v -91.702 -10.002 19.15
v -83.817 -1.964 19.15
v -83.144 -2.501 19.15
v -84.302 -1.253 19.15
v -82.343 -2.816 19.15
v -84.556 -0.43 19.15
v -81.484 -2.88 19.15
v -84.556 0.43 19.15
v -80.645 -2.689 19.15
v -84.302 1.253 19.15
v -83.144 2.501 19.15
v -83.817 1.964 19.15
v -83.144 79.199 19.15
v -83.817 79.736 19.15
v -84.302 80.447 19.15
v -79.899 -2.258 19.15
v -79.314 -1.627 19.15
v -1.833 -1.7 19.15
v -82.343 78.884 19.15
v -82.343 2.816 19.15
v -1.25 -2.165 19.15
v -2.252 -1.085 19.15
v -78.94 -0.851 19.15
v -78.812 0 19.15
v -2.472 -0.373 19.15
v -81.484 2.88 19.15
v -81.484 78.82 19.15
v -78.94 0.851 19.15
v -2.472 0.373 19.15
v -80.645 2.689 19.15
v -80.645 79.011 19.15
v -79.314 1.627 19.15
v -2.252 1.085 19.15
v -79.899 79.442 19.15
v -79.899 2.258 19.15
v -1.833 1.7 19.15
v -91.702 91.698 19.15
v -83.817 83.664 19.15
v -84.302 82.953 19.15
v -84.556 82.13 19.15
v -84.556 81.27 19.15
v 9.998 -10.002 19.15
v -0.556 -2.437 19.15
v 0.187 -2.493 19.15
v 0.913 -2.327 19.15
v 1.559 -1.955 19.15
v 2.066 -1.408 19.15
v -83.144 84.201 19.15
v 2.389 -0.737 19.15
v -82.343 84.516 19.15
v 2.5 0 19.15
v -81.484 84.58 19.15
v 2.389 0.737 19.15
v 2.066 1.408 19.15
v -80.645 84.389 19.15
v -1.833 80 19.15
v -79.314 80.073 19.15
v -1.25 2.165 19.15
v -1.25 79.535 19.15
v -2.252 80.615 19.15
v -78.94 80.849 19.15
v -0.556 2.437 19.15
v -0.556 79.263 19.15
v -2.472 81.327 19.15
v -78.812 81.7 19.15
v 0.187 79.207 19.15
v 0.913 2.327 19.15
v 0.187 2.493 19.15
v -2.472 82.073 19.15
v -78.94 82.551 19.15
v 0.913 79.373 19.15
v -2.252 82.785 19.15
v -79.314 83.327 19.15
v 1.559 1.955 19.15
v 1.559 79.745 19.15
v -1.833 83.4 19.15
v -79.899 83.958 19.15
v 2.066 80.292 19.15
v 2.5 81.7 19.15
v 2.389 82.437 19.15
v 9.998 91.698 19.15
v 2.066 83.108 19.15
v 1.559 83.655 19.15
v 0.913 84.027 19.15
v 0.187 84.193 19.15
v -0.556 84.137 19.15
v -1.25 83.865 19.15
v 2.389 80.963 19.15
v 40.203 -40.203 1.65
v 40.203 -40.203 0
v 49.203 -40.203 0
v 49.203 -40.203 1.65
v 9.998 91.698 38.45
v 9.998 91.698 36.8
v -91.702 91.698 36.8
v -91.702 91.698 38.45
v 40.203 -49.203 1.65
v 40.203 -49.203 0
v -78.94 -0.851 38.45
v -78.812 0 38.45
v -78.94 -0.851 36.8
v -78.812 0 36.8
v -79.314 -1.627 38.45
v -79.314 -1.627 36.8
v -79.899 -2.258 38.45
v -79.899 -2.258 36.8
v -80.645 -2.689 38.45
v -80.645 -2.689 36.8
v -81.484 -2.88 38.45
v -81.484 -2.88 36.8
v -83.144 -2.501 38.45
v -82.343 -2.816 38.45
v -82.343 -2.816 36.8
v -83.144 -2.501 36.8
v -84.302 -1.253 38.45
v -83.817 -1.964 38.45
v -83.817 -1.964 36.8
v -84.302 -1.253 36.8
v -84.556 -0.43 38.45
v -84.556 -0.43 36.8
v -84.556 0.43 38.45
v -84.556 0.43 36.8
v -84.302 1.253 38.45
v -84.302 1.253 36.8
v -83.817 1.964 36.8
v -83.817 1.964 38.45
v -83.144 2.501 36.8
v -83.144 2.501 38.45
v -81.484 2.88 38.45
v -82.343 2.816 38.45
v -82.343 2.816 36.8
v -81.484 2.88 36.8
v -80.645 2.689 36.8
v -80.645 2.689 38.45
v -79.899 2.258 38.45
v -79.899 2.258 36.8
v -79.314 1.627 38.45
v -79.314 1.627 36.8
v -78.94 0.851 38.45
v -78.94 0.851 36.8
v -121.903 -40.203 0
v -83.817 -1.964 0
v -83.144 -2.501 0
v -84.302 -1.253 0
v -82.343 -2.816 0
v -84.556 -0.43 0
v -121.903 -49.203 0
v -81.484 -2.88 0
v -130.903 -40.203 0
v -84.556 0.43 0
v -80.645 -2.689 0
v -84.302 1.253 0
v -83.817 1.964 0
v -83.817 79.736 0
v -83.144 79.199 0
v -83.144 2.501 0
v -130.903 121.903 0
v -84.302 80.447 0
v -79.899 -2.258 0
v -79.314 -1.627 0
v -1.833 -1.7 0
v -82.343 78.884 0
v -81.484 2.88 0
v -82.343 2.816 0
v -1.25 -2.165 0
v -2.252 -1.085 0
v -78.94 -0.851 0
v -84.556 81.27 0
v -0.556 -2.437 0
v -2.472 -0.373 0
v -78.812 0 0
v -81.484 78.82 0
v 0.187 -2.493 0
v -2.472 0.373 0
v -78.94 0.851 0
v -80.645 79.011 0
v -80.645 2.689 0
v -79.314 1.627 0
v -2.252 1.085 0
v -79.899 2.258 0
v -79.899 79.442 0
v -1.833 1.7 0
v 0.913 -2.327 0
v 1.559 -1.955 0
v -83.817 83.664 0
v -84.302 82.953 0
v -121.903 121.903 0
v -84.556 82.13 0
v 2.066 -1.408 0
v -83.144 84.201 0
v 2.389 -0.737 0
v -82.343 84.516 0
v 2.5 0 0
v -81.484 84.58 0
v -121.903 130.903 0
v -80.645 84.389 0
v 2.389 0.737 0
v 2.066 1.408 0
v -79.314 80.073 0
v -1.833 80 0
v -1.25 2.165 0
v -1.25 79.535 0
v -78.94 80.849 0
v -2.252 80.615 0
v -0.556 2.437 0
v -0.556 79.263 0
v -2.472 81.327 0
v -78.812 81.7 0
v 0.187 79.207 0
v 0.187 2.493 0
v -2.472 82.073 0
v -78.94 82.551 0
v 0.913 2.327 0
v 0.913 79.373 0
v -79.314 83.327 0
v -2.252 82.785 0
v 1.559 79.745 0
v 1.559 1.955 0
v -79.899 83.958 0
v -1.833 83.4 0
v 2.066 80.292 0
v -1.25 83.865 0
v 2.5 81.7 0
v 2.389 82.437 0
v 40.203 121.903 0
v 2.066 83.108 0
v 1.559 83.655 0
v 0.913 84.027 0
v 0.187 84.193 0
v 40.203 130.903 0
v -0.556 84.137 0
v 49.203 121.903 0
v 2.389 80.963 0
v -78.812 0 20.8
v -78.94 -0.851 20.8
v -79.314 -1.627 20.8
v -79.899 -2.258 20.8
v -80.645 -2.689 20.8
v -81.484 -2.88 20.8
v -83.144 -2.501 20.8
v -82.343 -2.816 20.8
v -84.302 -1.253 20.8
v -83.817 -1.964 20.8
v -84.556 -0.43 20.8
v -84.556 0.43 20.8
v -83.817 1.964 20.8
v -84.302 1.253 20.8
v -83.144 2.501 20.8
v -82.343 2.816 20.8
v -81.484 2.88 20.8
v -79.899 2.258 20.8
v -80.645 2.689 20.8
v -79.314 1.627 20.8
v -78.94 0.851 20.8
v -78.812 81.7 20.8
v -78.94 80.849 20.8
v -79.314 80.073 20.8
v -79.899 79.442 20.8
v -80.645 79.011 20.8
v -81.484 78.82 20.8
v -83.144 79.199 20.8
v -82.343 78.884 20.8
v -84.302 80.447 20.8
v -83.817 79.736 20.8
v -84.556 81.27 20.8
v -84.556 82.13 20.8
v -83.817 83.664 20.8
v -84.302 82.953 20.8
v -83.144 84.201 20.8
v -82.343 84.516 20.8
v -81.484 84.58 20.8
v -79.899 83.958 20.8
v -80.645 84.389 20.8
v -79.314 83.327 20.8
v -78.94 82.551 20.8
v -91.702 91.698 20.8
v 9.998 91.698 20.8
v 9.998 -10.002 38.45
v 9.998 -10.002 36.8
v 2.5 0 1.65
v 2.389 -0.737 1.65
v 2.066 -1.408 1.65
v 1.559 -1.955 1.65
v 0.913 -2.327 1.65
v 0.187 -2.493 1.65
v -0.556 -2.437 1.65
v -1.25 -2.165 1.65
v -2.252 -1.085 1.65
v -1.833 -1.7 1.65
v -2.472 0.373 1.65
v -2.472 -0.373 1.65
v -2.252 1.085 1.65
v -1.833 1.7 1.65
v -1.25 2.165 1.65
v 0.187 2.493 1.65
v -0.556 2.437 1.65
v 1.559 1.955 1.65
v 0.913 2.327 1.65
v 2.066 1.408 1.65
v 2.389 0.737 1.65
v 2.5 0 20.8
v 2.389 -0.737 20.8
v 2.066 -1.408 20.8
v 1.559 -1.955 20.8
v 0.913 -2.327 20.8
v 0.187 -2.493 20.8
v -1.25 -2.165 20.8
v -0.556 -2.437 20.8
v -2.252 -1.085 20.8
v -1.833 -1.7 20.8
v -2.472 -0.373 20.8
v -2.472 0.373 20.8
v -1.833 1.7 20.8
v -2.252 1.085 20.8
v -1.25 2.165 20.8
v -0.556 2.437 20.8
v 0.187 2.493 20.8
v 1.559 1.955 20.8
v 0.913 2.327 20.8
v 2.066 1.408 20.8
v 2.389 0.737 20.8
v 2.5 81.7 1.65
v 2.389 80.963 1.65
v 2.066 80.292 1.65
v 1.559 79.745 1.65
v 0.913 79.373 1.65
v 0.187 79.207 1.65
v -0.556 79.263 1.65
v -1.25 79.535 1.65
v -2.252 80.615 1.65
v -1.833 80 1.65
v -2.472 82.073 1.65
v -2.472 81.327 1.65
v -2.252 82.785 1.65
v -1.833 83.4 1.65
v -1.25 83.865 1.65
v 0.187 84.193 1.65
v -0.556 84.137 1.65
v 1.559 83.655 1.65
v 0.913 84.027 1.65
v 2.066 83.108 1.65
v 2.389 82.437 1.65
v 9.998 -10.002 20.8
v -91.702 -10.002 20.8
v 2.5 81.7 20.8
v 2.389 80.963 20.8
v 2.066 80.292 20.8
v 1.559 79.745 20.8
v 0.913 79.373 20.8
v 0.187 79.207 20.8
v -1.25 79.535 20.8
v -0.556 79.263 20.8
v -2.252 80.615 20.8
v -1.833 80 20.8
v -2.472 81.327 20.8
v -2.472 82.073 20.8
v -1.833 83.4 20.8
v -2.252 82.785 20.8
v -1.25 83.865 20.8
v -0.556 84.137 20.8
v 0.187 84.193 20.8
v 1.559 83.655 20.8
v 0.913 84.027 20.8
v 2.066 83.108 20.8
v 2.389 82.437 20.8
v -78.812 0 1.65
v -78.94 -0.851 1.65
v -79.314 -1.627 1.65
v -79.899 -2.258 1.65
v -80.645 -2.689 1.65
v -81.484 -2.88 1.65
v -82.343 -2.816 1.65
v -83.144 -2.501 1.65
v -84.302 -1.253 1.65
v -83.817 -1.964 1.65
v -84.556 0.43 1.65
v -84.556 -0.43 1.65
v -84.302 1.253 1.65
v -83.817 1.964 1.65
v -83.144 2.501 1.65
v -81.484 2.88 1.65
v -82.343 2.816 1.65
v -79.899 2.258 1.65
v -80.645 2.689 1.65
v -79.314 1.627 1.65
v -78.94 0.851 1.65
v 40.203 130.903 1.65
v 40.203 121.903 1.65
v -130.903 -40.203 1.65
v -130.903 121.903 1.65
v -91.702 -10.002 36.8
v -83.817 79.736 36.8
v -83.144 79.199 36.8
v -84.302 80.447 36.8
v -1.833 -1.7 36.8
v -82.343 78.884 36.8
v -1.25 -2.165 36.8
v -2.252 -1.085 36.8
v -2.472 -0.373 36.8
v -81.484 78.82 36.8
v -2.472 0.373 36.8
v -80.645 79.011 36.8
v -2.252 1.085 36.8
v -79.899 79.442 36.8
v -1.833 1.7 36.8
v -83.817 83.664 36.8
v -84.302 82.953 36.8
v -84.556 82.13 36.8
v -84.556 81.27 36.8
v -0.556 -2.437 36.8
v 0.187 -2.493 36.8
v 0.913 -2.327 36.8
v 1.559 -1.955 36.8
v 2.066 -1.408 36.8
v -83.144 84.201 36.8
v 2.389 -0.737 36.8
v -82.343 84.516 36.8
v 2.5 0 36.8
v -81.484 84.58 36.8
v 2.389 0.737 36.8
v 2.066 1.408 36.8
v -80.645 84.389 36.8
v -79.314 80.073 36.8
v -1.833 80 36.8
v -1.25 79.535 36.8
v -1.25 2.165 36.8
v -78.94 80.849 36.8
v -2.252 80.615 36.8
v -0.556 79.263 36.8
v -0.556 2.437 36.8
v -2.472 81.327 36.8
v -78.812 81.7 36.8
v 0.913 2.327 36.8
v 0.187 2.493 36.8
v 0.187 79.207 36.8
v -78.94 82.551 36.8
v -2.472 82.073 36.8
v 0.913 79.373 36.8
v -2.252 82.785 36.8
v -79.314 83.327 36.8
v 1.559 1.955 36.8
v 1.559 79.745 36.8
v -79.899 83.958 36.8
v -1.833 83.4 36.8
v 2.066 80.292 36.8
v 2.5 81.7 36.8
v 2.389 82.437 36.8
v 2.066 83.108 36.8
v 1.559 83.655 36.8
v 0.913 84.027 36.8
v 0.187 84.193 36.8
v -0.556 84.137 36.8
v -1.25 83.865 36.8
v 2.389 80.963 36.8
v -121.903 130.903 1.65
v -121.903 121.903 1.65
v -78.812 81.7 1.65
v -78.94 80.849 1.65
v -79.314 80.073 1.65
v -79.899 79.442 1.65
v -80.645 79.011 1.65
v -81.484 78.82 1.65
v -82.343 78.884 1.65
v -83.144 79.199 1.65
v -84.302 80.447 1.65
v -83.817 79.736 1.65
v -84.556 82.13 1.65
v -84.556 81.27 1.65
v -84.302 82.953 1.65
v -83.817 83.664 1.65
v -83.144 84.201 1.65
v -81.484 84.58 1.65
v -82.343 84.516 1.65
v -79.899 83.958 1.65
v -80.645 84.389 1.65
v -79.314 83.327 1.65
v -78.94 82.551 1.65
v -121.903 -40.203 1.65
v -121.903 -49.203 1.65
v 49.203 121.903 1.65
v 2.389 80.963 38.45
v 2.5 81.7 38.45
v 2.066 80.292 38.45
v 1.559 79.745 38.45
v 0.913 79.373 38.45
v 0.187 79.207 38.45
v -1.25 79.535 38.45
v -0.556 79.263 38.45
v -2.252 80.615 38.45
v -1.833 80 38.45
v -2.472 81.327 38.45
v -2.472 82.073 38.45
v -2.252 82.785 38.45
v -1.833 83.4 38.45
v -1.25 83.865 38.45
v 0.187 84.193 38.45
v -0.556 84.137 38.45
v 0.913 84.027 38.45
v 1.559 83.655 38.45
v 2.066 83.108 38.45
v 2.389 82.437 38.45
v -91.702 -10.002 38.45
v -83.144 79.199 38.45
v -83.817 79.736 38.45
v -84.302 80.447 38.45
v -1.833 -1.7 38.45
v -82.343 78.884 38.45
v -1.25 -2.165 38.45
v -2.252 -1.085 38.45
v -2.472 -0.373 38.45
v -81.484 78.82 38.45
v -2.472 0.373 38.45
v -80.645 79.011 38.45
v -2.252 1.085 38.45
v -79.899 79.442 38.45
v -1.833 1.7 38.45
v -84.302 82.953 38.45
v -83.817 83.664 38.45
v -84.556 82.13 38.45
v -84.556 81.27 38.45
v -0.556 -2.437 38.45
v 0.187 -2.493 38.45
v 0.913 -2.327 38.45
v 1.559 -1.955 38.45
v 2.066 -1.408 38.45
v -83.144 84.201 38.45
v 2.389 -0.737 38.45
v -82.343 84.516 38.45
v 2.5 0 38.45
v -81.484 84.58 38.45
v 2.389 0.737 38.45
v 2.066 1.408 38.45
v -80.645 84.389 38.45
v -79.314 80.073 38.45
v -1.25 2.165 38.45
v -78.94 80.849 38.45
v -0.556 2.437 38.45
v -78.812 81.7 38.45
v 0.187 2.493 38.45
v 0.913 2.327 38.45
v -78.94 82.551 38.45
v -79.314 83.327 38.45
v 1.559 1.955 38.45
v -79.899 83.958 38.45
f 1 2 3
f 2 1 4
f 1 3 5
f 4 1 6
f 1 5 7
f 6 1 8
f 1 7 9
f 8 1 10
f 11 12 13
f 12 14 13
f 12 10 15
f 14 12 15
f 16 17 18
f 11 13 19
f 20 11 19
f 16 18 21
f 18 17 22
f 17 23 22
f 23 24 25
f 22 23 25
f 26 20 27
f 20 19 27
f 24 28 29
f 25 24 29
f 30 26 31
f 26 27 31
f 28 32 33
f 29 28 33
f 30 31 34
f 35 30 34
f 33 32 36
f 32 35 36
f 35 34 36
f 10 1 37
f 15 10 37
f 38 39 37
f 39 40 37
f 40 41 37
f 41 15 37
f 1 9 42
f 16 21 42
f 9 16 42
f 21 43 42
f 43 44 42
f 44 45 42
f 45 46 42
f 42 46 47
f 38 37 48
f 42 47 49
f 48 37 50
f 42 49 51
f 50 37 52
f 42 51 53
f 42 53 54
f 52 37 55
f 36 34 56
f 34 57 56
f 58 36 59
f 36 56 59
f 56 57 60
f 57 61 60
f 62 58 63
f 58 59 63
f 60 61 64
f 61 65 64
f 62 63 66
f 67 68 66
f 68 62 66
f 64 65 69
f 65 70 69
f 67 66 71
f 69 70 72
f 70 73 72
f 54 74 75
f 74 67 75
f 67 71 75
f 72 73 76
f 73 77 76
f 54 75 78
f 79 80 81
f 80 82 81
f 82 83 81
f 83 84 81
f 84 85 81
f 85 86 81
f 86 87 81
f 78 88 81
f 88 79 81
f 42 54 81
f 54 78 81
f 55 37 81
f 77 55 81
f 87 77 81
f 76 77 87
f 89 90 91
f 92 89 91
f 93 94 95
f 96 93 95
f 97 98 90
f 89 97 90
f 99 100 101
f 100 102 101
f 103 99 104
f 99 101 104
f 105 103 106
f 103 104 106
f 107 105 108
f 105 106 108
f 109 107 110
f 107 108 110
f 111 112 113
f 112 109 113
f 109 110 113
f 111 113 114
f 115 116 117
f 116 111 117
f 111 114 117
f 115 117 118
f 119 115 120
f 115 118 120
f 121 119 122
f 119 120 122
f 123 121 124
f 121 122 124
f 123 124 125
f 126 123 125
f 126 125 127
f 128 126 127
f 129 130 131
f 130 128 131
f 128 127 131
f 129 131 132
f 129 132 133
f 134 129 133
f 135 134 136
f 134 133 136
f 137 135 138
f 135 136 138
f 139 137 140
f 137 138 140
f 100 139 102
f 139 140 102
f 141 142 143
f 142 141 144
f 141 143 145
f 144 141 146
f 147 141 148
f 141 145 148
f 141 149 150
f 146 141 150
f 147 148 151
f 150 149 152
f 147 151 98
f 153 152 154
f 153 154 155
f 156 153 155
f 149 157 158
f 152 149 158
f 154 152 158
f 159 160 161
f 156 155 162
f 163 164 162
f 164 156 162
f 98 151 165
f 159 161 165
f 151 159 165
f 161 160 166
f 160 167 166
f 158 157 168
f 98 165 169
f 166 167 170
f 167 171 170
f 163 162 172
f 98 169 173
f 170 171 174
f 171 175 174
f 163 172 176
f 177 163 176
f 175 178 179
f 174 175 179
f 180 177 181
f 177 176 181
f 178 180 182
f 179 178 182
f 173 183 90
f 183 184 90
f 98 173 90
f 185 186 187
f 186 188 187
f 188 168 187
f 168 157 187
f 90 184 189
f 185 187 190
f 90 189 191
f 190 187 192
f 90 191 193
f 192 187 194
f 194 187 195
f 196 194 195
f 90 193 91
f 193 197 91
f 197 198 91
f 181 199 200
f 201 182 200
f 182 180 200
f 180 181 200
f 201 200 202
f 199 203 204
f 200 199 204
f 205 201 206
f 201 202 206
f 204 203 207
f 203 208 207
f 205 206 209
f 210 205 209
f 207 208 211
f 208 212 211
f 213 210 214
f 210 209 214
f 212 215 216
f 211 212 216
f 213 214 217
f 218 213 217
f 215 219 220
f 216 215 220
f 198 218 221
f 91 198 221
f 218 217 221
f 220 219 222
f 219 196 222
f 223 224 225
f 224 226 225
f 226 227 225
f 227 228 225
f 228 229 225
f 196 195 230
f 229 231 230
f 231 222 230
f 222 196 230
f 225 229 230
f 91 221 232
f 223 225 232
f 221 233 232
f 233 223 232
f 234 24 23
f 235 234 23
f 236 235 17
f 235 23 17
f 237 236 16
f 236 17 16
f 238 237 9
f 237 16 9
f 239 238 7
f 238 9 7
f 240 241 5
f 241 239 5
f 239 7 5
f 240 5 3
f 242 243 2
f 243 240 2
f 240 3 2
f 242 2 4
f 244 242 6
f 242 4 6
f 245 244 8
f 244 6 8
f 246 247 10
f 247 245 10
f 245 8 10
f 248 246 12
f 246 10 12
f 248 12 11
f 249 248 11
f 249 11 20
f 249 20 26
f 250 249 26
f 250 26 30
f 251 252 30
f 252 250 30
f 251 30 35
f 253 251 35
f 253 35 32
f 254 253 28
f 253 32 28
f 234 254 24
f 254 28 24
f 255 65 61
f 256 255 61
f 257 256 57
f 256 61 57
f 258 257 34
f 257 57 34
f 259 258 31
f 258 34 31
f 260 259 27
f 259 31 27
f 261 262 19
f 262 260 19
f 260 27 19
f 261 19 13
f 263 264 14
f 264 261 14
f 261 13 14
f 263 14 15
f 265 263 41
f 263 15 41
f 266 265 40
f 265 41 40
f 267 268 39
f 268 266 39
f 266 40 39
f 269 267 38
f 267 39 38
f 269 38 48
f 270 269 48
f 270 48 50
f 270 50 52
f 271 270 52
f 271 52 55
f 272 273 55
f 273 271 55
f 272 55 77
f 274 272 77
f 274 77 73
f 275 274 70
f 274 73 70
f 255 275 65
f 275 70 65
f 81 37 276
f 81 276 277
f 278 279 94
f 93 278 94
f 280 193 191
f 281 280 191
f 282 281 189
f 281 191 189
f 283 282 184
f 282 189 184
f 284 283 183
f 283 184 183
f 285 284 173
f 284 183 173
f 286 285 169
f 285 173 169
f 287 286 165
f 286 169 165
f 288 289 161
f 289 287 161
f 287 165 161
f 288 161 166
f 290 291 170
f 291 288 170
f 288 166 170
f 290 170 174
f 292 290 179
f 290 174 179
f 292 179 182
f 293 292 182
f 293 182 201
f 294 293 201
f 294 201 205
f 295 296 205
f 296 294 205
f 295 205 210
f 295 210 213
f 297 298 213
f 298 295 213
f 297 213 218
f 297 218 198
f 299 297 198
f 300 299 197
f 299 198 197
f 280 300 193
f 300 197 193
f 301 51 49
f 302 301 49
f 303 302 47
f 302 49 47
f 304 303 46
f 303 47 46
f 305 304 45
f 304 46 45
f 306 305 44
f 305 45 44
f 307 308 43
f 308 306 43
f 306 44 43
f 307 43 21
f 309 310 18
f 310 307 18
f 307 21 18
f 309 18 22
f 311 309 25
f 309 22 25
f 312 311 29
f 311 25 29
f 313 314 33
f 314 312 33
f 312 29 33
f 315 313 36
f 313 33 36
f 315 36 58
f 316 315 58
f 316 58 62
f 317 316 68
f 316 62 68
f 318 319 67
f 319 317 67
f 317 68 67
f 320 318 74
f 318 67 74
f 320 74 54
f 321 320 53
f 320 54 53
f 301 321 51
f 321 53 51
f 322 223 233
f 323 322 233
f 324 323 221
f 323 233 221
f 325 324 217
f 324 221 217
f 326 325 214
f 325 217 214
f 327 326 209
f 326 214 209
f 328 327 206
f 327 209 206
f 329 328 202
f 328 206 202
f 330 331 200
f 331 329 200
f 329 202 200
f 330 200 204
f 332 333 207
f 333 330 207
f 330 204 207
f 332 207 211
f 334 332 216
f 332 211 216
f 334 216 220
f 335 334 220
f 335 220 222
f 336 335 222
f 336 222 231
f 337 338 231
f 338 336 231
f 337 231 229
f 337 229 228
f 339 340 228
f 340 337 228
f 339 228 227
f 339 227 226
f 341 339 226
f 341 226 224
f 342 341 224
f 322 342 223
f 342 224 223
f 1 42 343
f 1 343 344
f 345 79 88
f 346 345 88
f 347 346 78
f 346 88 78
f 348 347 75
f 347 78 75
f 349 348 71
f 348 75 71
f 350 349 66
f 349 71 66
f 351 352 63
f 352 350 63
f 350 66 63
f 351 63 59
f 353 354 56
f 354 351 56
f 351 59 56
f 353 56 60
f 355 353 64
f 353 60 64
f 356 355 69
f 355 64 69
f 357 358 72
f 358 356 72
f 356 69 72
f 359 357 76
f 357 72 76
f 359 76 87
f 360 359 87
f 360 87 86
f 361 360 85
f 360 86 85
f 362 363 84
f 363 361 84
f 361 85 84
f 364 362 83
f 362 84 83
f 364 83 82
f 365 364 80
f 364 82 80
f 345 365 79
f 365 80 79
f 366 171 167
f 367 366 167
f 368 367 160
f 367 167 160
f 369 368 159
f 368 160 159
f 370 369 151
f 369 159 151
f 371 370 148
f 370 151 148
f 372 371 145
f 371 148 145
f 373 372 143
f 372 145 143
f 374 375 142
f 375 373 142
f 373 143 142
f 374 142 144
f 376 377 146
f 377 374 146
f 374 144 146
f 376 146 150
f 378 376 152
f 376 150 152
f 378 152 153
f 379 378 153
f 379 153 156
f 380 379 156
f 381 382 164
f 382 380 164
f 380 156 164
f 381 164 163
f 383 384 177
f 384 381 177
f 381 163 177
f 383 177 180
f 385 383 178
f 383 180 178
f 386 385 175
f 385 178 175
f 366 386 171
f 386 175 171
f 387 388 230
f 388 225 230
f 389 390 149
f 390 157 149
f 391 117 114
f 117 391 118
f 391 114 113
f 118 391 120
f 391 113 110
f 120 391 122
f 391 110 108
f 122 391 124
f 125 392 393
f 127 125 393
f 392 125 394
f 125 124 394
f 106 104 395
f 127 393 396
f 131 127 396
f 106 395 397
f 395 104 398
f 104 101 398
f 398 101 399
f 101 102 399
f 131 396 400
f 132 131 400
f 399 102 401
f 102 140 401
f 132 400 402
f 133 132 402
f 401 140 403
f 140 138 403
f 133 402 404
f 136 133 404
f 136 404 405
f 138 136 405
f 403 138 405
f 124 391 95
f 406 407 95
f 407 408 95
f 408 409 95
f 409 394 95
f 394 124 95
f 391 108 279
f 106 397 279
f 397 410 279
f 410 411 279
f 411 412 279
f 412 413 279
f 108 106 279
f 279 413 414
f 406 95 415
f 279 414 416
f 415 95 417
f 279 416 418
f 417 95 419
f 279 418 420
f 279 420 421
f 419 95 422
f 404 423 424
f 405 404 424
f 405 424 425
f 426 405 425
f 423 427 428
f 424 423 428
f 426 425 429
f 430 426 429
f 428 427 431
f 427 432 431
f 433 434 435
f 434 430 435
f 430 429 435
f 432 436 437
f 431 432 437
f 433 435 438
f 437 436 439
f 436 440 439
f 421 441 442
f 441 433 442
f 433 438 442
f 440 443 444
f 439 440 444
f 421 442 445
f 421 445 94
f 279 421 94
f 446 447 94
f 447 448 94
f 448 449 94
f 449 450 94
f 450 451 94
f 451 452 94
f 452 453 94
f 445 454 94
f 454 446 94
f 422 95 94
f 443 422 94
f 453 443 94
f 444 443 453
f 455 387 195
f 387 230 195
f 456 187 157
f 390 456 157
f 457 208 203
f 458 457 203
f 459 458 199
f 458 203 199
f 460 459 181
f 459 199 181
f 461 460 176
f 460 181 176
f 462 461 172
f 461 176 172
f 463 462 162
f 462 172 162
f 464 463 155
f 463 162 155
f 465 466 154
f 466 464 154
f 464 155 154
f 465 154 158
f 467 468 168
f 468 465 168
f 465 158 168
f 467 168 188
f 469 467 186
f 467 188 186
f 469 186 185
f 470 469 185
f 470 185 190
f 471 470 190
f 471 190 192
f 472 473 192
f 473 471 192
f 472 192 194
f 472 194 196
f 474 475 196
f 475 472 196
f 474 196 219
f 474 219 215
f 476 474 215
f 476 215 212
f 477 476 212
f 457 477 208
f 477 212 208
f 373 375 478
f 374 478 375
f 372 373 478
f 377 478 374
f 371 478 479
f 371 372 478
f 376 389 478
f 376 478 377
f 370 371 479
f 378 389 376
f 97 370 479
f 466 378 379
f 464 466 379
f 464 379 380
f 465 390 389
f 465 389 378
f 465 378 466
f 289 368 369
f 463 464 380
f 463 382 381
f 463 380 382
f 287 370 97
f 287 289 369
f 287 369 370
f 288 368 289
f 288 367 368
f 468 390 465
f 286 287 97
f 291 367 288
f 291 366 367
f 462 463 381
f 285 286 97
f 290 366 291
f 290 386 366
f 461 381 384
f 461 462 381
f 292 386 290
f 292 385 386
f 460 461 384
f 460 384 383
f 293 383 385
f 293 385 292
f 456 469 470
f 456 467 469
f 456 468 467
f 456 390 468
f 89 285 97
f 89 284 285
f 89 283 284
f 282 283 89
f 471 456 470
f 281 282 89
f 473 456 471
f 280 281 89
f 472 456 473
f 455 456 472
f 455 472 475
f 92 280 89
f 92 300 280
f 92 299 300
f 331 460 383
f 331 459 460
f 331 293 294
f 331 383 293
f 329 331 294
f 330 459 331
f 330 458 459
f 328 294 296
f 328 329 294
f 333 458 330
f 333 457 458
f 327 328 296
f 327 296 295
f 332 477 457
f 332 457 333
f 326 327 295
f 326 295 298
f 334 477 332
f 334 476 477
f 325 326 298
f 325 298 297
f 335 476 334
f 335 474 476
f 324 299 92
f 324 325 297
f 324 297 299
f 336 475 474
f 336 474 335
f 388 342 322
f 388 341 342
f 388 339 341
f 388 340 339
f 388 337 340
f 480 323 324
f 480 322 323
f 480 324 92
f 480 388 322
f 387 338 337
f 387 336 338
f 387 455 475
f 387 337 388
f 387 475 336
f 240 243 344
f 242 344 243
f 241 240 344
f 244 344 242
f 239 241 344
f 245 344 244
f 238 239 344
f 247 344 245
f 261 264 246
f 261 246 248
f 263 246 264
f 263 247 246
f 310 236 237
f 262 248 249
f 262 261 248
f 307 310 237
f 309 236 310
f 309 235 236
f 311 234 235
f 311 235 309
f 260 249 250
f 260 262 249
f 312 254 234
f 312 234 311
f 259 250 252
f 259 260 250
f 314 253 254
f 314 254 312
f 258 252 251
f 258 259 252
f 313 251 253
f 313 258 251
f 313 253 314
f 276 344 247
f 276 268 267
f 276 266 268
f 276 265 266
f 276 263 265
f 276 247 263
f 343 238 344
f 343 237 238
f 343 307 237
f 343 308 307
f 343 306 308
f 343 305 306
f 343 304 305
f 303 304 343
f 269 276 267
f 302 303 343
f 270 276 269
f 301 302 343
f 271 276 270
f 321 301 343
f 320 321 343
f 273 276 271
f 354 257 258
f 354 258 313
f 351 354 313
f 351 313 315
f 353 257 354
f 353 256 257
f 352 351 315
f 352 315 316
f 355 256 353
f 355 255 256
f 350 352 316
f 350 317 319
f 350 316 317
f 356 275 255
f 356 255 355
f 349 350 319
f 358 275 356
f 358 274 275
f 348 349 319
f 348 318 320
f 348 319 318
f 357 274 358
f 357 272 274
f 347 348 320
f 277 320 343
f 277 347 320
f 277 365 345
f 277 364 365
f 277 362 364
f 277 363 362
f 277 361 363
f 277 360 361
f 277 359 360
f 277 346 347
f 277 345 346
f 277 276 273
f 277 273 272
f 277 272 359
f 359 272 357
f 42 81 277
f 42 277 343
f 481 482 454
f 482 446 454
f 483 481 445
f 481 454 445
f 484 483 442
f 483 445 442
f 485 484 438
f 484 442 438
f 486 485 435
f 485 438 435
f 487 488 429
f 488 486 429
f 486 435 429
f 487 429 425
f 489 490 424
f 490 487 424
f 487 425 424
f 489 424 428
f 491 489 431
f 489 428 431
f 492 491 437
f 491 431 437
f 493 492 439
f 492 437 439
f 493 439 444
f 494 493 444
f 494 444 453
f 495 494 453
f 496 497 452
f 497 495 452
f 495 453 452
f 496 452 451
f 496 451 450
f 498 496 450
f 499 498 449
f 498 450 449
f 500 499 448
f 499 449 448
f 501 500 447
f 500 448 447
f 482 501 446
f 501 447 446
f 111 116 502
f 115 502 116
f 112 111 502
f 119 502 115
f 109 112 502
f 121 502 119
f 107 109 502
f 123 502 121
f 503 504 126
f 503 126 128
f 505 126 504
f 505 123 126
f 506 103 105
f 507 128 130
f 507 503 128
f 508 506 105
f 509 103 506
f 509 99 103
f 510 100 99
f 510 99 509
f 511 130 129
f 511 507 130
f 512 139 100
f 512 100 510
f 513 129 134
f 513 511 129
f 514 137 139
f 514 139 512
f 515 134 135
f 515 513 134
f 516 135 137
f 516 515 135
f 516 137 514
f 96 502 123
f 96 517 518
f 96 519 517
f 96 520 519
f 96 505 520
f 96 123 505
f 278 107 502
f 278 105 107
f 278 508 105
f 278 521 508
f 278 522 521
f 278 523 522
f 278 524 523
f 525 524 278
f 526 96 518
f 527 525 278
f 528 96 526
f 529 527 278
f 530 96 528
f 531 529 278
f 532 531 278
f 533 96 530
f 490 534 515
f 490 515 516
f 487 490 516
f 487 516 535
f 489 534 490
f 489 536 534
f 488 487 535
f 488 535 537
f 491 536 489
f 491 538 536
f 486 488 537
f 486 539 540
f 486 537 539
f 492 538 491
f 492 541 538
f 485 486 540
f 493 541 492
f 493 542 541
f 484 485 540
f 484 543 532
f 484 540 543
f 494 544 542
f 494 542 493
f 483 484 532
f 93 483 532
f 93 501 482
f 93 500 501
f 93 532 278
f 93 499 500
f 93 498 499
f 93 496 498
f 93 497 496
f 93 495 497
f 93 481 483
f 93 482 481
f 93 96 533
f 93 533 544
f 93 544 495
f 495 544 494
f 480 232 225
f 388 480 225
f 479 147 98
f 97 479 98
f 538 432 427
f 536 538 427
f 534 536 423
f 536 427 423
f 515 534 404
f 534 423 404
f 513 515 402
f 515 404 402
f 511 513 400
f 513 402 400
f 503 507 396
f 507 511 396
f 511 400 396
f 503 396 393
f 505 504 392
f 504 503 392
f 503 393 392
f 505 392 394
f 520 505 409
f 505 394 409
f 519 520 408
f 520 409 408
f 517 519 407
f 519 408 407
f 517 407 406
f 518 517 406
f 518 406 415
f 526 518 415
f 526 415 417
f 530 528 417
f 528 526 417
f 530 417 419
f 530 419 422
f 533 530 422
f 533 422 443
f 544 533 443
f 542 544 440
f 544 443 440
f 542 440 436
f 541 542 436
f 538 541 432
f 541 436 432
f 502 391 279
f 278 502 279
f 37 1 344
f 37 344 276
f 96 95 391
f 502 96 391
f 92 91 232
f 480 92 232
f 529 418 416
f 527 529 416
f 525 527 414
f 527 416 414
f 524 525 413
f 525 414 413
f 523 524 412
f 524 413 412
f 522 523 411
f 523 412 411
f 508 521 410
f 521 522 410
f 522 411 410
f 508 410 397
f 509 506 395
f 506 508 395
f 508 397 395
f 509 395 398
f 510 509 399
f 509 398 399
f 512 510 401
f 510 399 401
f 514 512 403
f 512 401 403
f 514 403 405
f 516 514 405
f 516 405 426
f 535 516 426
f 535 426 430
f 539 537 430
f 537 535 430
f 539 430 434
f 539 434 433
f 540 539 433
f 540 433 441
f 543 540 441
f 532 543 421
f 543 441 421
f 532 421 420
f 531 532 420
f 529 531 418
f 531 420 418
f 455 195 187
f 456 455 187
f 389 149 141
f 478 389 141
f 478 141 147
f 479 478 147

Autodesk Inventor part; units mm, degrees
ref_plane "YZ Plane" through (0, 0, 0) normal (1, 0, 0) x (0, 1, 0)
sketch "Boceto1" plane through (0, 0, 0) normal (0, 0, 1) x (1, 0, 0)
  line L0 (-121.9033, -49.2033) -> (40.2033, -49.2033) projected
  line L1 (40.2033, -49.2033) -> (40.2033, -40.2033) projected
  line L2 (40.2033, -40.2033) -> (49.2033, -40.2033) projected
  line L3 (49.2033, -40.2033) -> (49.2033, 121.9033) projected
  line L4 (49.2033, 121.9033) -> (40.2033, 121.9033) projected
  line L5 (40.2033, 121.9033) -> (40.2033, 130.9033) projected
  line L6 (40.2033, 130.9033) -> (-121.9033, 130.9033) projected
  line L7 (-121.9033, 130.9033) -> (-121.9033, 121.9033) projected
  line L8 (-130.9033, 121.9033) -> (-130.9033, -40.2033) projected
  line L9 (-121.9033, 121.9033) -> (-130.9033, 121.9033) projected
  line L10 (-130.9033, -40.2033) -> (-121.9033, -40.2033) projected
  line L11 (-121.9033, -40.2033) -> (-121.9033, -49.2033) projected
  circle A0 centre (0, 0) radius 2.5 projected
  circle A1 centre (-81.7, 0) radius 2.8882 projected
  circle A2 centre (0, 81.7) radius 2.5 projected
  circle A3 centre (-81.7, 81.7) radius 2.8882 projected
  point P0 (0, 0)
extrude "Extrusión2" add sketch "Boceto1" along normal blind 1.65
ref_plane "Plano de trabajo1" through (0, 0, 19.15) normal (0, 0, 1) x (1, 0, 0)
sketch "Boceto2" plane through (0, 0, 19.15) normal (0, 0, 1) x (1, 0, 0)
  line L0 (40.2033, -49.2033) -> (40.2033, -40.2033) construction
  line L1 (40.2033, -40.2033) -> (49.2033, -40.2033) construction
  line L2 (49.2033, -40.2033) -> (49.2033, 121.9033) construction
  line L3 (49.2033, 121.9033) -> (40.2033, 121.9033) construction
  line L4 (40.2033, 121.9033) -> (40.2033, 130.9033) construction
  line L5 (40.2033, 130.9033) -> (-121.9033, 130.9033) construction
  line L6 (-121.9033, 130.9033) -> (-121.9033, 121.9033) construction
  line L7 (-121.9033, 121.9033) -> (-130.9033, 121.9033) construction
  line L8 (-130.9033, 121.9033) -> (-130.9033, -40.2033) construction
  line L9 (-130.9033, -40.2033) -> (-121.9033, -40.2033) construction
  line L10 (-121.9033, -40.2033) -> (-121.9033, -49.2033) construction
  line L11 (-121.9033, -49.2033) -> (40.2033, -49.2033) construction
  circle A0 centre (0, 0) radius 2.5 projected
  circle A1 centre (-81.7, 0) radius 2.8882 projected
  circle A2 centre (0, 81.7) radius 2.5 projected
  circle A3 centre (-81.7, 81.7) radius 2.8882 projected
  line L12 (-91.7016, 91.6984) -> (9.9984, 91.6984)
  line L13 (9.9984, 91.6984) -> (9.9984, -10.0016)
  line L14 (9.9984, -10.0016) -> (-91.7016, -10.0016)
  line L15 (-91.7016, -10.0016) -> (-91.7016, 91.6984)
  line L16 (-91.7016, 91.6984) -> (9.9984, -10.0016) construction
  line L17 (9.9984, 91.6984) -> (-91.7016, -10.0016) construction
  point P0 (0, 0)
  point P1 (-40.8516, 40.8484)
  dimension "d5" = 101.7
  dimension "d6" = 101.7
  dimension "d7" = 39.2049
  dimension "d8" = 39.2017
  dimension "d9" = 39.2049
extrude "Extrusión3" add sketch "Boceto2" along normal blind 1.65
ref_plane "Plano de trabajo2" through (0, 0, 36.8) normal (0, 0, 1) x (1, 0, 0)
sketch "Boceto3" plane through (0, 0, 36.8) normal (0, 0, 1) x (1, 0, 0)
  line L0 (-91.7016, -10.0016) -> (9.9984, -10.0016) projected
  line L1 (9.9984, -10.0016) -> (9.9984, 91.6984) projected
  line L2 (9.9984, 91.6984) -> (-91.7016, 91.6984) projected
  line L3 (-91.7016, 91.6984) -> (-91.7016, -10.0016) projected
  circle A0 centre (-81.7, 81.7) radius 2.8882 projected
  circle A1 centre (0, 81.7) radius 2.5 projected
  circle A2 centre (-81.7, 0) radius 2.8882 projected
  circle A3 centre (0, 0) radius 2.5 projected
  point P0 (0, 0)
extrude "Extrusión4" add sketch "Boceto3" along normal blind 1.65
properties part number "PCB_COM_BAT"
